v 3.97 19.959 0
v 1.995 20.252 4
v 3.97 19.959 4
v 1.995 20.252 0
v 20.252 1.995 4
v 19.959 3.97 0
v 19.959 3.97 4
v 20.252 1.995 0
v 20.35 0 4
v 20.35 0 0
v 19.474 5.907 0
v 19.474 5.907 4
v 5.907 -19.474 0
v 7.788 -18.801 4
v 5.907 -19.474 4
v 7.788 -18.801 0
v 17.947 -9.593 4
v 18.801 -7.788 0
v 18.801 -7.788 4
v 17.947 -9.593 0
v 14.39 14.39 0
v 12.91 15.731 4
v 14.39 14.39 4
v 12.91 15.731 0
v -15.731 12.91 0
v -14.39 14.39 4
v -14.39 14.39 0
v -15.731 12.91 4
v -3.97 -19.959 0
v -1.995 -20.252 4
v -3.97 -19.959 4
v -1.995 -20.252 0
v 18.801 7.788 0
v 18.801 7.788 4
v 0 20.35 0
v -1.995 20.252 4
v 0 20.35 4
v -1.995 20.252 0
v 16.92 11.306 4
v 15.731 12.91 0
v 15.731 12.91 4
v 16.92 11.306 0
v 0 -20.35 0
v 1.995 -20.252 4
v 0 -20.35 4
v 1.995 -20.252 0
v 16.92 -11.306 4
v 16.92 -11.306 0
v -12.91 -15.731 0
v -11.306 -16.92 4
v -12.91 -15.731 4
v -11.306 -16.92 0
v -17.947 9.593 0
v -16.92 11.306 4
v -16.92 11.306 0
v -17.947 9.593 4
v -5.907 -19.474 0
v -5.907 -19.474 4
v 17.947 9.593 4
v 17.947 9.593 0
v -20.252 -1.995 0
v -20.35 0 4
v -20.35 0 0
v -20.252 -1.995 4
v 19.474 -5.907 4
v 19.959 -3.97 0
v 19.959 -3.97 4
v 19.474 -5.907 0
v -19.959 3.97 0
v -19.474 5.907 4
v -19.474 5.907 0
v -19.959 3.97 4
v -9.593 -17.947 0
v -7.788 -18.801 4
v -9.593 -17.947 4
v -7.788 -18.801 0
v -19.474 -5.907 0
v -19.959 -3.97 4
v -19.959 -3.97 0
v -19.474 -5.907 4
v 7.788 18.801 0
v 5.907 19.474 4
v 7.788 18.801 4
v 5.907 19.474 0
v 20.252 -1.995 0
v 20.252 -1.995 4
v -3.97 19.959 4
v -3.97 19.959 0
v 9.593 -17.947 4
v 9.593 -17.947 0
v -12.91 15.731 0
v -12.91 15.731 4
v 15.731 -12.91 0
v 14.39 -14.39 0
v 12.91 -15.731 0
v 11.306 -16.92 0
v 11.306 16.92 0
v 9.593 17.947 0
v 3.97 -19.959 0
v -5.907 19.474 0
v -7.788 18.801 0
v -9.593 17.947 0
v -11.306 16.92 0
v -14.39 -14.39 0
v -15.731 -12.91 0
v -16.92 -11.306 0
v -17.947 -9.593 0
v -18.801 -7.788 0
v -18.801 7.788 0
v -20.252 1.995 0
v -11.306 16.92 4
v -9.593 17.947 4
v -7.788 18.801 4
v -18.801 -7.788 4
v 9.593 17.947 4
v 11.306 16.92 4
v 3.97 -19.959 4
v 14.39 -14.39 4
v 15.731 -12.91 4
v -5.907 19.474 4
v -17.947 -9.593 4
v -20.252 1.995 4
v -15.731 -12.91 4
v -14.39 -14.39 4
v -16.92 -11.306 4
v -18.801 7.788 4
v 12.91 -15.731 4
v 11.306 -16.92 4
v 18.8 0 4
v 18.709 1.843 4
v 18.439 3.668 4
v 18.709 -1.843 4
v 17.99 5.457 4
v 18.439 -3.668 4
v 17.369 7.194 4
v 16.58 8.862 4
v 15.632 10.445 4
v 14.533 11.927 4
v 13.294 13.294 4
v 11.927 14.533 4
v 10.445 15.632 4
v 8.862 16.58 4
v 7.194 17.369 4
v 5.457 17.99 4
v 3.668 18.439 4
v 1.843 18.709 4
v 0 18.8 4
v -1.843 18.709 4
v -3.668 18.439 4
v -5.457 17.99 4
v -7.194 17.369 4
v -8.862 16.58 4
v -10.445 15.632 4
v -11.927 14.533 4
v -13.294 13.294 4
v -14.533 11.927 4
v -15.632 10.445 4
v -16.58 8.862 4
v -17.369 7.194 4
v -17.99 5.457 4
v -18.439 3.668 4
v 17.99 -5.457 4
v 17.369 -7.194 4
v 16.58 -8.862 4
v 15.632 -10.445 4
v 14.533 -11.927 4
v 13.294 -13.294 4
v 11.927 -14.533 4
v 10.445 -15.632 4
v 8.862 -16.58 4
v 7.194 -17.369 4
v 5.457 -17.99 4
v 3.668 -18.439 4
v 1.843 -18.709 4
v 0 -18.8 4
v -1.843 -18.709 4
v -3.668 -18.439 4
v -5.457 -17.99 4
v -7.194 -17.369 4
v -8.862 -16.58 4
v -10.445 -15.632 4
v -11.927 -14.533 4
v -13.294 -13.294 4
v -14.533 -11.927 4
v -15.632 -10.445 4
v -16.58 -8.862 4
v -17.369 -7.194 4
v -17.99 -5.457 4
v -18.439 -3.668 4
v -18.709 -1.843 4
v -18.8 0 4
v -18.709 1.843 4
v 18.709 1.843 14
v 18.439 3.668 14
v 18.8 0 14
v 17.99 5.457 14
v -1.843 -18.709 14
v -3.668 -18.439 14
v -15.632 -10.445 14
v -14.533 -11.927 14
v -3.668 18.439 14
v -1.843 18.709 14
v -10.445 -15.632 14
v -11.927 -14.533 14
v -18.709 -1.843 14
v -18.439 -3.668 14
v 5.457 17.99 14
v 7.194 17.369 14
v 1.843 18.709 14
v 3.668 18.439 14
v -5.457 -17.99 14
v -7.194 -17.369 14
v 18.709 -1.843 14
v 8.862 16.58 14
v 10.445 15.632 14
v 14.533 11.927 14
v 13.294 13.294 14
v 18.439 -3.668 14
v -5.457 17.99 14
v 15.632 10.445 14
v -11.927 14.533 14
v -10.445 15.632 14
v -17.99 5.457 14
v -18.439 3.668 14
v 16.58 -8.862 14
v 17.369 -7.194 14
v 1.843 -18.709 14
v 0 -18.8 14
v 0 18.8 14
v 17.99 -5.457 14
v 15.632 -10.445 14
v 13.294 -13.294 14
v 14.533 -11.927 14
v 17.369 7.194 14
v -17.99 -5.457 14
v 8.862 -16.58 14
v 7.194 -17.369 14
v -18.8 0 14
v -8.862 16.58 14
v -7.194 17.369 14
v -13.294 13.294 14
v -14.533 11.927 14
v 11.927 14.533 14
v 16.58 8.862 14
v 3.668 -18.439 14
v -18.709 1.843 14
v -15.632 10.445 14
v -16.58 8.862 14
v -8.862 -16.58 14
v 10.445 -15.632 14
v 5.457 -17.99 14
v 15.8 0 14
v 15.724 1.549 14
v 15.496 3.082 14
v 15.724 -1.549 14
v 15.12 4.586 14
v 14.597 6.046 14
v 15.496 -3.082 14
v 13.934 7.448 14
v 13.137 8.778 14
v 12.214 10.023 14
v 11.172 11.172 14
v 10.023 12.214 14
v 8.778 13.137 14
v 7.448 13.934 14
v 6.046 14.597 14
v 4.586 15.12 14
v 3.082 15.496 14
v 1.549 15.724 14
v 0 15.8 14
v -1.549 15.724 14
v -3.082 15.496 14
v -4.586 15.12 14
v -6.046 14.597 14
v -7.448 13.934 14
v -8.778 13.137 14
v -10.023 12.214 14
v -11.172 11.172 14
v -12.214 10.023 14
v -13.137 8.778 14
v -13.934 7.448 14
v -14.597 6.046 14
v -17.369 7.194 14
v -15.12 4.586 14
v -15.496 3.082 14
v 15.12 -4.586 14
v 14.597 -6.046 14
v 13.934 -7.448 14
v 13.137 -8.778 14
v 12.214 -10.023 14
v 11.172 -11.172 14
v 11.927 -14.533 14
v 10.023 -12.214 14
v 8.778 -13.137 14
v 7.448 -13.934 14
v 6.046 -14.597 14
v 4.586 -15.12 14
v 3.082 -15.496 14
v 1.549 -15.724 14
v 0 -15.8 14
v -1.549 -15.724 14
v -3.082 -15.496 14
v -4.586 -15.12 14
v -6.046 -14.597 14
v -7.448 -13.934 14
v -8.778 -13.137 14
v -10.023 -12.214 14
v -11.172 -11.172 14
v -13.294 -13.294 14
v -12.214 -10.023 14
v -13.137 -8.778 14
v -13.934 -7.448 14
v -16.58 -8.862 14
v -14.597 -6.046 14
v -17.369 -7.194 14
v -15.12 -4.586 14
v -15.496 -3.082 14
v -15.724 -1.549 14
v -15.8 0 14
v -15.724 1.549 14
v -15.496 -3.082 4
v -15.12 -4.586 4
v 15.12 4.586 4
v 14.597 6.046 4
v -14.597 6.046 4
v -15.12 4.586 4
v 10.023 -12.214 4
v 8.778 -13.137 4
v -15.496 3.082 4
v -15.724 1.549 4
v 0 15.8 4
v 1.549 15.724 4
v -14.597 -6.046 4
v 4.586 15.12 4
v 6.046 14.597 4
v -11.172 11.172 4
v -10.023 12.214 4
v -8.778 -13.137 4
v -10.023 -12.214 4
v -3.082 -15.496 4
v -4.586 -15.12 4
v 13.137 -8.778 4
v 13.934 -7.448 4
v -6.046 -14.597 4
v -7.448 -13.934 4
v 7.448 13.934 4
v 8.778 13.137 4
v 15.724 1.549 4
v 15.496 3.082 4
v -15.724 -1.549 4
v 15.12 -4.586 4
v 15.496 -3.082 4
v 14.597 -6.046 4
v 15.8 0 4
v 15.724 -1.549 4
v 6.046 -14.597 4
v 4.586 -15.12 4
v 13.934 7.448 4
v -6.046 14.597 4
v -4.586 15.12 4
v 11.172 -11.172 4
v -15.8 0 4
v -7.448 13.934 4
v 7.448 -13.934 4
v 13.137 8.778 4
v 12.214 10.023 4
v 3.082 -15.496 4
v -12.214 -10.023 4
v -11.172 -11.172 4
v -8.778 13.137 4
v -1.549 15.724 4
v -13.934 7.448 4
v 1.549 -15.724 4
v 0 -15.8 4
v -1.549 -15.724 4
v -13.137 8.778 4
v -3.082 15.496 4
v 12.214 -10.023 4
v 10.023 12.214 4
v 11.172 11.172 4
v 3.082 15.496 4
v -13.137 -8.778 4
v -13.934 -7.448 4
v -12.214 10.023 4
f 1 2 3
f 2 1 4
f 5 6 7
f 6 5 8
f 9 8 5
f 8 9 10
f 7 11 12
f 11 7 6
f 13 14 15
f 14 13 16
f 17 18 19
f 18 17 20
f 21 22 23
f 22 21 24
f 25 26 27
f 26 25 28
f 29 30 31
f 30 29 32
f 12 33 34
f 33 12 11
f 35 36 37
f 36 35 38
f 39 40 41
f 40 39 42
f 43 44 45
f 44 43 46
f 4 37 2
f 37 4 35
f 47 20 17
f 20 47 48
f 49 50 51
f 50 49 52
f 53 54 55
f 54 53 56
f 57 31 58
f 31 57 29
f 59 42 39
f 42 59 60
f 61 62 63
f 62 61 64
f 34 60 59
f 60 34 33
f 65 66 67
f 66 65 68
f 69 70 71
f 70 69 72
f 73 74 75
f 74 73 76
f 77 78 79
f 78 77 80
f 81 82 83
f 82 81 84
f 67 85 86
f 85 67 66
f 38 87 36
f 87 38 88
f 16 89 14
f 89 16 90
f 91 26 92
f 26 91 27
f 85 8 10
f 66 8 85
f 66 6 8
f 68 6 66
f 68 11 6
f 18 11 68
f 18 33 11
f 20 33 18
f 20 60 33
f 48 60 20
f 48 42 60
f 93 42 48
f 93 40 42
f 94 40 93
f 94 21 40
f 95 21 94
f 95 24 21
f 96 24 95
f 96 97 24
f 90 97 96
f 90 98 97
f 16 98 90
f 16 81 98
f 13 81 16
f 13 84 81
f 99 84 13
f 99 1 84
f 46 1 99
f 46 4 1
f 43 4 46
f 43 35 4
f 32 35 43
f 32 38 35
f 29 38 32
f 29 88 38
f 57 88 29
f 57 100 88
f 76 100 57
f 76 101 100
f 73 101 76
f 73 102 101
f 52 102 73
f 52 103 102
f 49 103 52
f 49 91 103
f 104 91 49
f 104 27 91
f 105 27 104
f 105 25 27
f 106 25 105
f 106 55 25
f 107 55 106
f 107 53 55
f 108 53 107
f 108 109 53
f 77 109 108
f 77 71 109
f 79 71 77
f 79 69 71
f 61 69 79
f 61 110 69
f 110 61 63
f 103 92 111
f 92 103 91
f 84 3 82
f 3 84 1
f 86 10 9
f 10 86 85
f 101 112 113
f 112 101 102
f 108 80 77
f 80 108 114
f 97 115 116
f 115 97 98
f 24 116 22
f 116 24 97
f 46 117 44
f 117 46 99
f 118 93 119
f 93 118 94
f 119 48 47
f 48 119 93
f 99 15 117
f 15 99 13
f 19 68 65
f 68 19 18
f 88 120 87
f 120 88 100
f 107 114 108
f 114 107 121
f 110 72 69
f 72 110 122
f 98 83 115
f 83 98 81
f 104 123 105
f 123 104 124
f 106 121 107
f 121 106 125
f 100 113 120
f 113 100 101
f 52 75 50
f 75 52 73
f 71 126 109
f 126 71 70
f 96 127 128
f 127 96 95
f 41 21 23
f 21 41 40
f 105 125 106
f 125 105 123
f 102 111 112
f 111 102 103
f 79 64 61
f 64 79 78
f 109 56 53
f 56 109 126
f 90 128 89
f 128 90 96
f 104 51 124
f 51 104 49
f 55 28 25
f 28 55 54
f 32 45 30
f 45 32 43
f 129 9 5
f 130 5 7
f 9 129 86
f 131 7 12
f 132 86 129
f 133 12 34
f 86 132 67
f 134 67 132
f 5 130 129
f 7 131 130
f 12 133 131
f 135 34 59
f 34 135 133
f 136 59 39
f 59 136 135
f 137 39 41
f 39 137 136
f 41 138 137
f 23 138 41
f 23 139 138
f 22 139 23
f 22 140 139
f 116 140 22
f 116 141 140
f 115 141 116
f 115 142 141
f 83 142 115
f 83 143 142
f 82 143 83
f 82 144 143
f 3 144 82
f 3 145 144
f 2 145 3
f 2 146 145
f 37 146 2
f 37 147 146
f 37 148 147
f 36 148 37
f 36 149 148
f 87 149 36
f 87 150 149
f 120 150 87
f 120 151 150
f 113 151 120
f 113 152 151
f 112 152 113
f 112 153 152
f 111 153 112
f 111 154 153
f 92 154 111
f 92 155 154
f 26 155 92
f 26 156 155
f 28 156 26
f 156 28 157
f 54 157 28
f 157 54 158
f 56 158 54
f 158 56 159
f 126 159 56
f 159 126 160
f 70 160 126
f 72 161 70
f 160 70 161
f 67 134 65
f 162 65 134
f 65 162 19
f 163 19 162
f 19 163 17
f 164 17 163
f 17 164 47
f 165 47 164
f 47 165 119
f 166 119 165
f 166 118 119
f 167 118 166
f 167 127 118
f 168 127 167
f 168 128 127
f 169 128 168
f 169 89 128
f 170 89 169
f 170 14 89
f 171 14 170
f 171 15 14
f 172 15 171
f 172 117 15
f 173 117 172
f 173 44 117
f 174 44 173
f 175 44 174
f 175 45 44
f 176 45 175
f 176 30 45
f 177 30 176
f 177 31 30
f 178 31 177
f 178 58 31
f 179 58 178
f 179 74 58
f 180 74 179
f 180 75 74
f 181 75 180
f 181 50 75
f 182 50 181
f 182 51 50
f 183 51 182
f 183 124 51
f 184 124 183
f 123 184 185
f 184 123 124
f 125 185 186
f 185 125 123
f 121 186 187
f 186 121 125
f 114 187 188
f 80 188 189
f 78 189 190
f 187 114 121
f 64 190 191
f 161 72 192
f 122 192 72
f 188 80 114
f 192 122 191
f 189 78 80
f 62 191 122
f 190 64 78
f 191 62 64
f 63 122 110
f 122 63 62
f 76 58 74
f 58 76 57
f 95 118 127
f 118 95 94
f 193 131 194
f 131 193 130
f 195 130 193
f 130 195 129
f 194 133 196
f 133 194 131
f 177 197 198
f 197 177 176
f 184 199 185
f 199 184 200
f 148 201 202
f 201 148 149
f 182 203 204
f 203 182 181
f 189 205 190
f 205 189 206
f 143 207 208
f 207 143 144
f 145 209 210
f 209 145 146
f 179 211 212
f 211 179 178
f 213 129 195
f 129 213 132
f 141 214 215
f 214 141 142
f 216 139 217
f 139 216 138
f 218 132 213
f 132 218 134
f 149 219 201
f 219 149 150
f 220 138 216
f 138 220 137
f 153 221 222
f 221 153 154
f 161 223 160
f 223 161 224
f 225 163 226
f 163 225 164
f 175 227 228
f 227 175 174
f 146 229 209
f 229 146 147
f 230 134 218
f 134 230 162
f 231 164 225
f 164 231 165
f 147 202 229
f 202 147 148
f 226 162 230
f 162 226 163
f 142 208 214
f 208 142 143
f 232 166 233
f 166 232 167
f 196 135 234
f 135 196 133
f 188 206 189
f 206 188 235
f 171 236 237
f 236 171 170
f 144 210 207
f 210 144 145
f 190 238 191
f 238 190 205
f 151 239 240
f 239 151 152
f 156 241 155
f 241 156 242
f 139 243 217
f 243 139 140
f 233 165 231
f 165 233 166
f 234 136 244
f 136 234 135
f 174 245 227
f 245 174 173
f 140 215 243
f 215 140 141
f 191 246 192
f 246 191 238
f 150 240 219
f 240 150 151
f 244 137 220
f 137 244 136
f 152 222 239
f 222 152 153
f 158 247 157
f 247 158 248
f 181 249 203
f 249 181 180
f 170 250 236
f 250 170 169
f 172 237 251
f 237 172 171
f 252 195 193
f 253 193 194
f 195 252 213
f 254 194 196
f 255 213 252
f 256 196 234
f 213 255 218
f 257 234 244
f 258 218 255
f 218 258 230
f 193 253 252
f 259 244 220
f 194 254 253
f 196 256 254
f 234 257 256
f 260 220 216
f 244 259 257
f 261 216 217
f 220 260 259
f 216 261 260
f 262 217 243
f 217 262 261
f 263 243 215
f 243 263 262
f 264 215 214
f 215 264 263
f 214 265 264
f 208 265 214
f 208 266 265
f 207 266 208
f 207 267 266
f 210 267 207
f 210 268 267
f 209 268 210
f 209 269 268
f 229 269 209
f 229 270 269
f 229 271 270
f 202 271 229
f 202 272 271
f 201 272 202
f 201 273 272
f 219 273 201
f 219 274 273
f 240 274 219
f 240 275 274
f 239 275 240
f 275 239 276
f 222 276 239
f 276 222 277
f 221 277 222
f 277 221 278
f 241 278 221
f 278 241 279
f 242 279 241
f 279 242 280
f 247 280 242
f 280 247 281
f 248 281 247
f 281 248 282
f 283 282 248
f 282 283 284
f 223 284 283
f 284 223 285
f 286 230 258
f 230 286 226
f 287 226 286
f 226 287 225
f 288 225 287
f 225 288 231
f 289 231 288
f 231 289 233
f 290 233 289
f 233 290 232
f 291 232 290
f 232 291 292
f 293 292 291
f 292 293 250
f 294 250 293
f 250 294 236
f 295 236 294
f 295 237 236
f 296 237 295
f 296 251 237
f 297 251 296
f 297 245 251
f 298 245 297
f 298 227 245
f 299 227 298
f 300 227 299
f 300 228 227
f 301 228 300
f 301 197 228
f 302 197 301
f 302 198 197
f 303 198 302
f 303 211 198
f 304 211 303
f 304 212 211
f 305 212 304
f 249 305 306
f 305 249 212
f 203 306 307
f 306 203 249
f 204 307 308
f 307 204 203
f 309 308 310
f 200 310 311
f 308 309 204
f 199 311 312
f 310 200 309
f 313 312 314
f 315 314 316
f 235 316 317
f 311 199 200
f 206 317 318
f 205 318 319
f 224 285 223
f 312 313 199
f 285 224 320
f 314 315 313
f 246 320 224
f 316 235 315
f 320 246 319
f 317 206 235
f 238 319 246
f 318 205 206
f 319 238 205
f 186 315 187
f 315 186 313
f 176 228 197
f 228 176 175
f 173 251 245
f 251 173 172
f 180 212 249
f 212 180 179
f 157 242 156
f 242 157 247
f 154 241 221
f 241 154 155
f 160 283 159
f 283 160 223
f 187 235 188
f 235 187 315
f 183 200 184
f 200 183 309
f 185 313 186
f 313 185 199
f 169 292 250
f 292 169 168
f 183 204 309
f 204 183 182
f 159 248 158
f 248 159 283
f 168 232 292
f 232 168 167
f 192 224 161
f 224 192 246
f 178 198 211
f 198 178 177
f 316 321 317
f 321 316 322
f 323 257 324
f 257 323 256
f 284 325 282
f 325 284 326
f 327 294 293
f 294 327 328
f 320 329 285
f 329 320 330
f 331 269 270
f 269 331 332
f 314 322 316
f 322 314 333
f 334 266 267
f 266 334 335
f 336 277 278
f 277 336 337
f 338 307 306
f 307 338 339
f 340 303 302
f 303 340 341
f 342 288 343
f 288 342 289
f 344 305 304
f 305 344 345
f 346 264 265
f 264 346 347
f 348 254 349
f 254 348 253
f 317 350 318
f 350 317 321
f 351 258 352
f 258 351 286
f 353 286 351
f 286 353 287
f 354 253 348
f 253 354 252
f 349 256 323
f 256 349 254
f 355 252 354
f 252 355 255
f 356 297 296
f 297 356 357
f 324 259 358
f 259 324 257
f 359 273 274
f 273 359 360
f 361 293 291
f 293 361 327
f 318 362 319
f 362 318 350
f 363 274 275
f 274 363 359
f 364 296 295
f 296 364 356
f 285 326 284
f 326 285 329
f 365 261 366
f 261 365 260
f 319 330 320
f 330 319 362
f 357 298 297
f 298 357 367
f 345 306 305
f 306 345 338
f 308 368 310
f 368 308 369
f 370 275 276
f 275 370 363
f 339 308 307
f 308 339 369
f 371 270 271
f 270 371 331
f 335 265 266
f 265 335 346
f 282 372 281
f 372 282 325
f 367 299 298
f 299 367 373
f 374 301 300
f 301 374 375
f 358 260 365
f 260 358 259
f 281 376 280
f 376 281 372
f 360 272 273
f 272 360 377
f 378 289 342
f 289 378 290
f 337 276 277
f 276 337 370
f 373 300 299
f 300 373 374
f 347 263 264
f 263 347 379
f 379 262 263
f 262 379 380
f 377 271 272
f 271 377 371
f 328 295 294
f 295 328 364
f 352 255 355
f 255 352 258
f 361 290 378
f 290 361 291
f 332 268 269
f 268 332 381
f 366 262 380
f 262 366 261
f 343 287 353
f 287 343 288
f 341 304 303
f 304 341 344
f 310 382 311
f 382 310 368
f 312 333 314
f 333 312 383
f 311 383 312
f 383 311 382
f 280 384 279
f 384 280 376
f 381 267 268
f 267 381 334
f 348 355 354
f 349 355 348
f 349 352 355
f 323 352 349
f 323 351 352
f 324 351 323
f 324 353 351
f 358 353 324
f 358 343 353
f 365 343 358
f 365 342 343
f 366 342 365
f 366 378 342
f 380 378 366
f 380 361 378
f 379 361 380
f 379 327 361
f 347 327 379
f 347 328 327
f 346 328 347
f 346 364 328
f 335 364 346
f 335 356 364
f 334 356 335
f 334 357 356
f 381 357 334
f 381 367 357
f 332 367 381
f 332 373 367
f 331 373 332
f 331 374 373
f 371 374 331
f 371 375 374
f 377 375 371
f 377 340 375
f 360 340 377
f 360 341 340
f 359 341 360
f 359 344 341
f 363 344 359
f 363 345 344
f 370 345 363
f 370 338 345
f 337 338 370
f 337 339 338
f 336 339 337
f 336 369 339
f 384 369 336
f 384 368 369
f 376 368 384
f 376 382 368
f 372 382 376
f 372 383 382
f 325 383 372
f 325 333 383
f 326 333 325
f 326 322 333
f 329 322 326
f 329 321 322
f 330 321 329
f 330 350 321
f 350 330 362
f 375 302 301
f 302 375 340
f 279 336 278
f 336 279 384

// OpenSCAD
// tube inner diameter
inner = 37.6;
// tube outer diameter
outer = 40.7;
// foot height
height = 4;
// innter part height
innerHeight = 10;
// inner part wall thickness
thick = 3;
$fn = 64;

difference () {

    union () {
        cylinder (height, outer/2, outer/2);
        translate ([0,0,height]) cylinder (innerHeight, inner/2, inner/2);
    }

    translate ([0,0,height]) cylinder (innerHeight, inner/2-thick, inner/2-thick);
}
